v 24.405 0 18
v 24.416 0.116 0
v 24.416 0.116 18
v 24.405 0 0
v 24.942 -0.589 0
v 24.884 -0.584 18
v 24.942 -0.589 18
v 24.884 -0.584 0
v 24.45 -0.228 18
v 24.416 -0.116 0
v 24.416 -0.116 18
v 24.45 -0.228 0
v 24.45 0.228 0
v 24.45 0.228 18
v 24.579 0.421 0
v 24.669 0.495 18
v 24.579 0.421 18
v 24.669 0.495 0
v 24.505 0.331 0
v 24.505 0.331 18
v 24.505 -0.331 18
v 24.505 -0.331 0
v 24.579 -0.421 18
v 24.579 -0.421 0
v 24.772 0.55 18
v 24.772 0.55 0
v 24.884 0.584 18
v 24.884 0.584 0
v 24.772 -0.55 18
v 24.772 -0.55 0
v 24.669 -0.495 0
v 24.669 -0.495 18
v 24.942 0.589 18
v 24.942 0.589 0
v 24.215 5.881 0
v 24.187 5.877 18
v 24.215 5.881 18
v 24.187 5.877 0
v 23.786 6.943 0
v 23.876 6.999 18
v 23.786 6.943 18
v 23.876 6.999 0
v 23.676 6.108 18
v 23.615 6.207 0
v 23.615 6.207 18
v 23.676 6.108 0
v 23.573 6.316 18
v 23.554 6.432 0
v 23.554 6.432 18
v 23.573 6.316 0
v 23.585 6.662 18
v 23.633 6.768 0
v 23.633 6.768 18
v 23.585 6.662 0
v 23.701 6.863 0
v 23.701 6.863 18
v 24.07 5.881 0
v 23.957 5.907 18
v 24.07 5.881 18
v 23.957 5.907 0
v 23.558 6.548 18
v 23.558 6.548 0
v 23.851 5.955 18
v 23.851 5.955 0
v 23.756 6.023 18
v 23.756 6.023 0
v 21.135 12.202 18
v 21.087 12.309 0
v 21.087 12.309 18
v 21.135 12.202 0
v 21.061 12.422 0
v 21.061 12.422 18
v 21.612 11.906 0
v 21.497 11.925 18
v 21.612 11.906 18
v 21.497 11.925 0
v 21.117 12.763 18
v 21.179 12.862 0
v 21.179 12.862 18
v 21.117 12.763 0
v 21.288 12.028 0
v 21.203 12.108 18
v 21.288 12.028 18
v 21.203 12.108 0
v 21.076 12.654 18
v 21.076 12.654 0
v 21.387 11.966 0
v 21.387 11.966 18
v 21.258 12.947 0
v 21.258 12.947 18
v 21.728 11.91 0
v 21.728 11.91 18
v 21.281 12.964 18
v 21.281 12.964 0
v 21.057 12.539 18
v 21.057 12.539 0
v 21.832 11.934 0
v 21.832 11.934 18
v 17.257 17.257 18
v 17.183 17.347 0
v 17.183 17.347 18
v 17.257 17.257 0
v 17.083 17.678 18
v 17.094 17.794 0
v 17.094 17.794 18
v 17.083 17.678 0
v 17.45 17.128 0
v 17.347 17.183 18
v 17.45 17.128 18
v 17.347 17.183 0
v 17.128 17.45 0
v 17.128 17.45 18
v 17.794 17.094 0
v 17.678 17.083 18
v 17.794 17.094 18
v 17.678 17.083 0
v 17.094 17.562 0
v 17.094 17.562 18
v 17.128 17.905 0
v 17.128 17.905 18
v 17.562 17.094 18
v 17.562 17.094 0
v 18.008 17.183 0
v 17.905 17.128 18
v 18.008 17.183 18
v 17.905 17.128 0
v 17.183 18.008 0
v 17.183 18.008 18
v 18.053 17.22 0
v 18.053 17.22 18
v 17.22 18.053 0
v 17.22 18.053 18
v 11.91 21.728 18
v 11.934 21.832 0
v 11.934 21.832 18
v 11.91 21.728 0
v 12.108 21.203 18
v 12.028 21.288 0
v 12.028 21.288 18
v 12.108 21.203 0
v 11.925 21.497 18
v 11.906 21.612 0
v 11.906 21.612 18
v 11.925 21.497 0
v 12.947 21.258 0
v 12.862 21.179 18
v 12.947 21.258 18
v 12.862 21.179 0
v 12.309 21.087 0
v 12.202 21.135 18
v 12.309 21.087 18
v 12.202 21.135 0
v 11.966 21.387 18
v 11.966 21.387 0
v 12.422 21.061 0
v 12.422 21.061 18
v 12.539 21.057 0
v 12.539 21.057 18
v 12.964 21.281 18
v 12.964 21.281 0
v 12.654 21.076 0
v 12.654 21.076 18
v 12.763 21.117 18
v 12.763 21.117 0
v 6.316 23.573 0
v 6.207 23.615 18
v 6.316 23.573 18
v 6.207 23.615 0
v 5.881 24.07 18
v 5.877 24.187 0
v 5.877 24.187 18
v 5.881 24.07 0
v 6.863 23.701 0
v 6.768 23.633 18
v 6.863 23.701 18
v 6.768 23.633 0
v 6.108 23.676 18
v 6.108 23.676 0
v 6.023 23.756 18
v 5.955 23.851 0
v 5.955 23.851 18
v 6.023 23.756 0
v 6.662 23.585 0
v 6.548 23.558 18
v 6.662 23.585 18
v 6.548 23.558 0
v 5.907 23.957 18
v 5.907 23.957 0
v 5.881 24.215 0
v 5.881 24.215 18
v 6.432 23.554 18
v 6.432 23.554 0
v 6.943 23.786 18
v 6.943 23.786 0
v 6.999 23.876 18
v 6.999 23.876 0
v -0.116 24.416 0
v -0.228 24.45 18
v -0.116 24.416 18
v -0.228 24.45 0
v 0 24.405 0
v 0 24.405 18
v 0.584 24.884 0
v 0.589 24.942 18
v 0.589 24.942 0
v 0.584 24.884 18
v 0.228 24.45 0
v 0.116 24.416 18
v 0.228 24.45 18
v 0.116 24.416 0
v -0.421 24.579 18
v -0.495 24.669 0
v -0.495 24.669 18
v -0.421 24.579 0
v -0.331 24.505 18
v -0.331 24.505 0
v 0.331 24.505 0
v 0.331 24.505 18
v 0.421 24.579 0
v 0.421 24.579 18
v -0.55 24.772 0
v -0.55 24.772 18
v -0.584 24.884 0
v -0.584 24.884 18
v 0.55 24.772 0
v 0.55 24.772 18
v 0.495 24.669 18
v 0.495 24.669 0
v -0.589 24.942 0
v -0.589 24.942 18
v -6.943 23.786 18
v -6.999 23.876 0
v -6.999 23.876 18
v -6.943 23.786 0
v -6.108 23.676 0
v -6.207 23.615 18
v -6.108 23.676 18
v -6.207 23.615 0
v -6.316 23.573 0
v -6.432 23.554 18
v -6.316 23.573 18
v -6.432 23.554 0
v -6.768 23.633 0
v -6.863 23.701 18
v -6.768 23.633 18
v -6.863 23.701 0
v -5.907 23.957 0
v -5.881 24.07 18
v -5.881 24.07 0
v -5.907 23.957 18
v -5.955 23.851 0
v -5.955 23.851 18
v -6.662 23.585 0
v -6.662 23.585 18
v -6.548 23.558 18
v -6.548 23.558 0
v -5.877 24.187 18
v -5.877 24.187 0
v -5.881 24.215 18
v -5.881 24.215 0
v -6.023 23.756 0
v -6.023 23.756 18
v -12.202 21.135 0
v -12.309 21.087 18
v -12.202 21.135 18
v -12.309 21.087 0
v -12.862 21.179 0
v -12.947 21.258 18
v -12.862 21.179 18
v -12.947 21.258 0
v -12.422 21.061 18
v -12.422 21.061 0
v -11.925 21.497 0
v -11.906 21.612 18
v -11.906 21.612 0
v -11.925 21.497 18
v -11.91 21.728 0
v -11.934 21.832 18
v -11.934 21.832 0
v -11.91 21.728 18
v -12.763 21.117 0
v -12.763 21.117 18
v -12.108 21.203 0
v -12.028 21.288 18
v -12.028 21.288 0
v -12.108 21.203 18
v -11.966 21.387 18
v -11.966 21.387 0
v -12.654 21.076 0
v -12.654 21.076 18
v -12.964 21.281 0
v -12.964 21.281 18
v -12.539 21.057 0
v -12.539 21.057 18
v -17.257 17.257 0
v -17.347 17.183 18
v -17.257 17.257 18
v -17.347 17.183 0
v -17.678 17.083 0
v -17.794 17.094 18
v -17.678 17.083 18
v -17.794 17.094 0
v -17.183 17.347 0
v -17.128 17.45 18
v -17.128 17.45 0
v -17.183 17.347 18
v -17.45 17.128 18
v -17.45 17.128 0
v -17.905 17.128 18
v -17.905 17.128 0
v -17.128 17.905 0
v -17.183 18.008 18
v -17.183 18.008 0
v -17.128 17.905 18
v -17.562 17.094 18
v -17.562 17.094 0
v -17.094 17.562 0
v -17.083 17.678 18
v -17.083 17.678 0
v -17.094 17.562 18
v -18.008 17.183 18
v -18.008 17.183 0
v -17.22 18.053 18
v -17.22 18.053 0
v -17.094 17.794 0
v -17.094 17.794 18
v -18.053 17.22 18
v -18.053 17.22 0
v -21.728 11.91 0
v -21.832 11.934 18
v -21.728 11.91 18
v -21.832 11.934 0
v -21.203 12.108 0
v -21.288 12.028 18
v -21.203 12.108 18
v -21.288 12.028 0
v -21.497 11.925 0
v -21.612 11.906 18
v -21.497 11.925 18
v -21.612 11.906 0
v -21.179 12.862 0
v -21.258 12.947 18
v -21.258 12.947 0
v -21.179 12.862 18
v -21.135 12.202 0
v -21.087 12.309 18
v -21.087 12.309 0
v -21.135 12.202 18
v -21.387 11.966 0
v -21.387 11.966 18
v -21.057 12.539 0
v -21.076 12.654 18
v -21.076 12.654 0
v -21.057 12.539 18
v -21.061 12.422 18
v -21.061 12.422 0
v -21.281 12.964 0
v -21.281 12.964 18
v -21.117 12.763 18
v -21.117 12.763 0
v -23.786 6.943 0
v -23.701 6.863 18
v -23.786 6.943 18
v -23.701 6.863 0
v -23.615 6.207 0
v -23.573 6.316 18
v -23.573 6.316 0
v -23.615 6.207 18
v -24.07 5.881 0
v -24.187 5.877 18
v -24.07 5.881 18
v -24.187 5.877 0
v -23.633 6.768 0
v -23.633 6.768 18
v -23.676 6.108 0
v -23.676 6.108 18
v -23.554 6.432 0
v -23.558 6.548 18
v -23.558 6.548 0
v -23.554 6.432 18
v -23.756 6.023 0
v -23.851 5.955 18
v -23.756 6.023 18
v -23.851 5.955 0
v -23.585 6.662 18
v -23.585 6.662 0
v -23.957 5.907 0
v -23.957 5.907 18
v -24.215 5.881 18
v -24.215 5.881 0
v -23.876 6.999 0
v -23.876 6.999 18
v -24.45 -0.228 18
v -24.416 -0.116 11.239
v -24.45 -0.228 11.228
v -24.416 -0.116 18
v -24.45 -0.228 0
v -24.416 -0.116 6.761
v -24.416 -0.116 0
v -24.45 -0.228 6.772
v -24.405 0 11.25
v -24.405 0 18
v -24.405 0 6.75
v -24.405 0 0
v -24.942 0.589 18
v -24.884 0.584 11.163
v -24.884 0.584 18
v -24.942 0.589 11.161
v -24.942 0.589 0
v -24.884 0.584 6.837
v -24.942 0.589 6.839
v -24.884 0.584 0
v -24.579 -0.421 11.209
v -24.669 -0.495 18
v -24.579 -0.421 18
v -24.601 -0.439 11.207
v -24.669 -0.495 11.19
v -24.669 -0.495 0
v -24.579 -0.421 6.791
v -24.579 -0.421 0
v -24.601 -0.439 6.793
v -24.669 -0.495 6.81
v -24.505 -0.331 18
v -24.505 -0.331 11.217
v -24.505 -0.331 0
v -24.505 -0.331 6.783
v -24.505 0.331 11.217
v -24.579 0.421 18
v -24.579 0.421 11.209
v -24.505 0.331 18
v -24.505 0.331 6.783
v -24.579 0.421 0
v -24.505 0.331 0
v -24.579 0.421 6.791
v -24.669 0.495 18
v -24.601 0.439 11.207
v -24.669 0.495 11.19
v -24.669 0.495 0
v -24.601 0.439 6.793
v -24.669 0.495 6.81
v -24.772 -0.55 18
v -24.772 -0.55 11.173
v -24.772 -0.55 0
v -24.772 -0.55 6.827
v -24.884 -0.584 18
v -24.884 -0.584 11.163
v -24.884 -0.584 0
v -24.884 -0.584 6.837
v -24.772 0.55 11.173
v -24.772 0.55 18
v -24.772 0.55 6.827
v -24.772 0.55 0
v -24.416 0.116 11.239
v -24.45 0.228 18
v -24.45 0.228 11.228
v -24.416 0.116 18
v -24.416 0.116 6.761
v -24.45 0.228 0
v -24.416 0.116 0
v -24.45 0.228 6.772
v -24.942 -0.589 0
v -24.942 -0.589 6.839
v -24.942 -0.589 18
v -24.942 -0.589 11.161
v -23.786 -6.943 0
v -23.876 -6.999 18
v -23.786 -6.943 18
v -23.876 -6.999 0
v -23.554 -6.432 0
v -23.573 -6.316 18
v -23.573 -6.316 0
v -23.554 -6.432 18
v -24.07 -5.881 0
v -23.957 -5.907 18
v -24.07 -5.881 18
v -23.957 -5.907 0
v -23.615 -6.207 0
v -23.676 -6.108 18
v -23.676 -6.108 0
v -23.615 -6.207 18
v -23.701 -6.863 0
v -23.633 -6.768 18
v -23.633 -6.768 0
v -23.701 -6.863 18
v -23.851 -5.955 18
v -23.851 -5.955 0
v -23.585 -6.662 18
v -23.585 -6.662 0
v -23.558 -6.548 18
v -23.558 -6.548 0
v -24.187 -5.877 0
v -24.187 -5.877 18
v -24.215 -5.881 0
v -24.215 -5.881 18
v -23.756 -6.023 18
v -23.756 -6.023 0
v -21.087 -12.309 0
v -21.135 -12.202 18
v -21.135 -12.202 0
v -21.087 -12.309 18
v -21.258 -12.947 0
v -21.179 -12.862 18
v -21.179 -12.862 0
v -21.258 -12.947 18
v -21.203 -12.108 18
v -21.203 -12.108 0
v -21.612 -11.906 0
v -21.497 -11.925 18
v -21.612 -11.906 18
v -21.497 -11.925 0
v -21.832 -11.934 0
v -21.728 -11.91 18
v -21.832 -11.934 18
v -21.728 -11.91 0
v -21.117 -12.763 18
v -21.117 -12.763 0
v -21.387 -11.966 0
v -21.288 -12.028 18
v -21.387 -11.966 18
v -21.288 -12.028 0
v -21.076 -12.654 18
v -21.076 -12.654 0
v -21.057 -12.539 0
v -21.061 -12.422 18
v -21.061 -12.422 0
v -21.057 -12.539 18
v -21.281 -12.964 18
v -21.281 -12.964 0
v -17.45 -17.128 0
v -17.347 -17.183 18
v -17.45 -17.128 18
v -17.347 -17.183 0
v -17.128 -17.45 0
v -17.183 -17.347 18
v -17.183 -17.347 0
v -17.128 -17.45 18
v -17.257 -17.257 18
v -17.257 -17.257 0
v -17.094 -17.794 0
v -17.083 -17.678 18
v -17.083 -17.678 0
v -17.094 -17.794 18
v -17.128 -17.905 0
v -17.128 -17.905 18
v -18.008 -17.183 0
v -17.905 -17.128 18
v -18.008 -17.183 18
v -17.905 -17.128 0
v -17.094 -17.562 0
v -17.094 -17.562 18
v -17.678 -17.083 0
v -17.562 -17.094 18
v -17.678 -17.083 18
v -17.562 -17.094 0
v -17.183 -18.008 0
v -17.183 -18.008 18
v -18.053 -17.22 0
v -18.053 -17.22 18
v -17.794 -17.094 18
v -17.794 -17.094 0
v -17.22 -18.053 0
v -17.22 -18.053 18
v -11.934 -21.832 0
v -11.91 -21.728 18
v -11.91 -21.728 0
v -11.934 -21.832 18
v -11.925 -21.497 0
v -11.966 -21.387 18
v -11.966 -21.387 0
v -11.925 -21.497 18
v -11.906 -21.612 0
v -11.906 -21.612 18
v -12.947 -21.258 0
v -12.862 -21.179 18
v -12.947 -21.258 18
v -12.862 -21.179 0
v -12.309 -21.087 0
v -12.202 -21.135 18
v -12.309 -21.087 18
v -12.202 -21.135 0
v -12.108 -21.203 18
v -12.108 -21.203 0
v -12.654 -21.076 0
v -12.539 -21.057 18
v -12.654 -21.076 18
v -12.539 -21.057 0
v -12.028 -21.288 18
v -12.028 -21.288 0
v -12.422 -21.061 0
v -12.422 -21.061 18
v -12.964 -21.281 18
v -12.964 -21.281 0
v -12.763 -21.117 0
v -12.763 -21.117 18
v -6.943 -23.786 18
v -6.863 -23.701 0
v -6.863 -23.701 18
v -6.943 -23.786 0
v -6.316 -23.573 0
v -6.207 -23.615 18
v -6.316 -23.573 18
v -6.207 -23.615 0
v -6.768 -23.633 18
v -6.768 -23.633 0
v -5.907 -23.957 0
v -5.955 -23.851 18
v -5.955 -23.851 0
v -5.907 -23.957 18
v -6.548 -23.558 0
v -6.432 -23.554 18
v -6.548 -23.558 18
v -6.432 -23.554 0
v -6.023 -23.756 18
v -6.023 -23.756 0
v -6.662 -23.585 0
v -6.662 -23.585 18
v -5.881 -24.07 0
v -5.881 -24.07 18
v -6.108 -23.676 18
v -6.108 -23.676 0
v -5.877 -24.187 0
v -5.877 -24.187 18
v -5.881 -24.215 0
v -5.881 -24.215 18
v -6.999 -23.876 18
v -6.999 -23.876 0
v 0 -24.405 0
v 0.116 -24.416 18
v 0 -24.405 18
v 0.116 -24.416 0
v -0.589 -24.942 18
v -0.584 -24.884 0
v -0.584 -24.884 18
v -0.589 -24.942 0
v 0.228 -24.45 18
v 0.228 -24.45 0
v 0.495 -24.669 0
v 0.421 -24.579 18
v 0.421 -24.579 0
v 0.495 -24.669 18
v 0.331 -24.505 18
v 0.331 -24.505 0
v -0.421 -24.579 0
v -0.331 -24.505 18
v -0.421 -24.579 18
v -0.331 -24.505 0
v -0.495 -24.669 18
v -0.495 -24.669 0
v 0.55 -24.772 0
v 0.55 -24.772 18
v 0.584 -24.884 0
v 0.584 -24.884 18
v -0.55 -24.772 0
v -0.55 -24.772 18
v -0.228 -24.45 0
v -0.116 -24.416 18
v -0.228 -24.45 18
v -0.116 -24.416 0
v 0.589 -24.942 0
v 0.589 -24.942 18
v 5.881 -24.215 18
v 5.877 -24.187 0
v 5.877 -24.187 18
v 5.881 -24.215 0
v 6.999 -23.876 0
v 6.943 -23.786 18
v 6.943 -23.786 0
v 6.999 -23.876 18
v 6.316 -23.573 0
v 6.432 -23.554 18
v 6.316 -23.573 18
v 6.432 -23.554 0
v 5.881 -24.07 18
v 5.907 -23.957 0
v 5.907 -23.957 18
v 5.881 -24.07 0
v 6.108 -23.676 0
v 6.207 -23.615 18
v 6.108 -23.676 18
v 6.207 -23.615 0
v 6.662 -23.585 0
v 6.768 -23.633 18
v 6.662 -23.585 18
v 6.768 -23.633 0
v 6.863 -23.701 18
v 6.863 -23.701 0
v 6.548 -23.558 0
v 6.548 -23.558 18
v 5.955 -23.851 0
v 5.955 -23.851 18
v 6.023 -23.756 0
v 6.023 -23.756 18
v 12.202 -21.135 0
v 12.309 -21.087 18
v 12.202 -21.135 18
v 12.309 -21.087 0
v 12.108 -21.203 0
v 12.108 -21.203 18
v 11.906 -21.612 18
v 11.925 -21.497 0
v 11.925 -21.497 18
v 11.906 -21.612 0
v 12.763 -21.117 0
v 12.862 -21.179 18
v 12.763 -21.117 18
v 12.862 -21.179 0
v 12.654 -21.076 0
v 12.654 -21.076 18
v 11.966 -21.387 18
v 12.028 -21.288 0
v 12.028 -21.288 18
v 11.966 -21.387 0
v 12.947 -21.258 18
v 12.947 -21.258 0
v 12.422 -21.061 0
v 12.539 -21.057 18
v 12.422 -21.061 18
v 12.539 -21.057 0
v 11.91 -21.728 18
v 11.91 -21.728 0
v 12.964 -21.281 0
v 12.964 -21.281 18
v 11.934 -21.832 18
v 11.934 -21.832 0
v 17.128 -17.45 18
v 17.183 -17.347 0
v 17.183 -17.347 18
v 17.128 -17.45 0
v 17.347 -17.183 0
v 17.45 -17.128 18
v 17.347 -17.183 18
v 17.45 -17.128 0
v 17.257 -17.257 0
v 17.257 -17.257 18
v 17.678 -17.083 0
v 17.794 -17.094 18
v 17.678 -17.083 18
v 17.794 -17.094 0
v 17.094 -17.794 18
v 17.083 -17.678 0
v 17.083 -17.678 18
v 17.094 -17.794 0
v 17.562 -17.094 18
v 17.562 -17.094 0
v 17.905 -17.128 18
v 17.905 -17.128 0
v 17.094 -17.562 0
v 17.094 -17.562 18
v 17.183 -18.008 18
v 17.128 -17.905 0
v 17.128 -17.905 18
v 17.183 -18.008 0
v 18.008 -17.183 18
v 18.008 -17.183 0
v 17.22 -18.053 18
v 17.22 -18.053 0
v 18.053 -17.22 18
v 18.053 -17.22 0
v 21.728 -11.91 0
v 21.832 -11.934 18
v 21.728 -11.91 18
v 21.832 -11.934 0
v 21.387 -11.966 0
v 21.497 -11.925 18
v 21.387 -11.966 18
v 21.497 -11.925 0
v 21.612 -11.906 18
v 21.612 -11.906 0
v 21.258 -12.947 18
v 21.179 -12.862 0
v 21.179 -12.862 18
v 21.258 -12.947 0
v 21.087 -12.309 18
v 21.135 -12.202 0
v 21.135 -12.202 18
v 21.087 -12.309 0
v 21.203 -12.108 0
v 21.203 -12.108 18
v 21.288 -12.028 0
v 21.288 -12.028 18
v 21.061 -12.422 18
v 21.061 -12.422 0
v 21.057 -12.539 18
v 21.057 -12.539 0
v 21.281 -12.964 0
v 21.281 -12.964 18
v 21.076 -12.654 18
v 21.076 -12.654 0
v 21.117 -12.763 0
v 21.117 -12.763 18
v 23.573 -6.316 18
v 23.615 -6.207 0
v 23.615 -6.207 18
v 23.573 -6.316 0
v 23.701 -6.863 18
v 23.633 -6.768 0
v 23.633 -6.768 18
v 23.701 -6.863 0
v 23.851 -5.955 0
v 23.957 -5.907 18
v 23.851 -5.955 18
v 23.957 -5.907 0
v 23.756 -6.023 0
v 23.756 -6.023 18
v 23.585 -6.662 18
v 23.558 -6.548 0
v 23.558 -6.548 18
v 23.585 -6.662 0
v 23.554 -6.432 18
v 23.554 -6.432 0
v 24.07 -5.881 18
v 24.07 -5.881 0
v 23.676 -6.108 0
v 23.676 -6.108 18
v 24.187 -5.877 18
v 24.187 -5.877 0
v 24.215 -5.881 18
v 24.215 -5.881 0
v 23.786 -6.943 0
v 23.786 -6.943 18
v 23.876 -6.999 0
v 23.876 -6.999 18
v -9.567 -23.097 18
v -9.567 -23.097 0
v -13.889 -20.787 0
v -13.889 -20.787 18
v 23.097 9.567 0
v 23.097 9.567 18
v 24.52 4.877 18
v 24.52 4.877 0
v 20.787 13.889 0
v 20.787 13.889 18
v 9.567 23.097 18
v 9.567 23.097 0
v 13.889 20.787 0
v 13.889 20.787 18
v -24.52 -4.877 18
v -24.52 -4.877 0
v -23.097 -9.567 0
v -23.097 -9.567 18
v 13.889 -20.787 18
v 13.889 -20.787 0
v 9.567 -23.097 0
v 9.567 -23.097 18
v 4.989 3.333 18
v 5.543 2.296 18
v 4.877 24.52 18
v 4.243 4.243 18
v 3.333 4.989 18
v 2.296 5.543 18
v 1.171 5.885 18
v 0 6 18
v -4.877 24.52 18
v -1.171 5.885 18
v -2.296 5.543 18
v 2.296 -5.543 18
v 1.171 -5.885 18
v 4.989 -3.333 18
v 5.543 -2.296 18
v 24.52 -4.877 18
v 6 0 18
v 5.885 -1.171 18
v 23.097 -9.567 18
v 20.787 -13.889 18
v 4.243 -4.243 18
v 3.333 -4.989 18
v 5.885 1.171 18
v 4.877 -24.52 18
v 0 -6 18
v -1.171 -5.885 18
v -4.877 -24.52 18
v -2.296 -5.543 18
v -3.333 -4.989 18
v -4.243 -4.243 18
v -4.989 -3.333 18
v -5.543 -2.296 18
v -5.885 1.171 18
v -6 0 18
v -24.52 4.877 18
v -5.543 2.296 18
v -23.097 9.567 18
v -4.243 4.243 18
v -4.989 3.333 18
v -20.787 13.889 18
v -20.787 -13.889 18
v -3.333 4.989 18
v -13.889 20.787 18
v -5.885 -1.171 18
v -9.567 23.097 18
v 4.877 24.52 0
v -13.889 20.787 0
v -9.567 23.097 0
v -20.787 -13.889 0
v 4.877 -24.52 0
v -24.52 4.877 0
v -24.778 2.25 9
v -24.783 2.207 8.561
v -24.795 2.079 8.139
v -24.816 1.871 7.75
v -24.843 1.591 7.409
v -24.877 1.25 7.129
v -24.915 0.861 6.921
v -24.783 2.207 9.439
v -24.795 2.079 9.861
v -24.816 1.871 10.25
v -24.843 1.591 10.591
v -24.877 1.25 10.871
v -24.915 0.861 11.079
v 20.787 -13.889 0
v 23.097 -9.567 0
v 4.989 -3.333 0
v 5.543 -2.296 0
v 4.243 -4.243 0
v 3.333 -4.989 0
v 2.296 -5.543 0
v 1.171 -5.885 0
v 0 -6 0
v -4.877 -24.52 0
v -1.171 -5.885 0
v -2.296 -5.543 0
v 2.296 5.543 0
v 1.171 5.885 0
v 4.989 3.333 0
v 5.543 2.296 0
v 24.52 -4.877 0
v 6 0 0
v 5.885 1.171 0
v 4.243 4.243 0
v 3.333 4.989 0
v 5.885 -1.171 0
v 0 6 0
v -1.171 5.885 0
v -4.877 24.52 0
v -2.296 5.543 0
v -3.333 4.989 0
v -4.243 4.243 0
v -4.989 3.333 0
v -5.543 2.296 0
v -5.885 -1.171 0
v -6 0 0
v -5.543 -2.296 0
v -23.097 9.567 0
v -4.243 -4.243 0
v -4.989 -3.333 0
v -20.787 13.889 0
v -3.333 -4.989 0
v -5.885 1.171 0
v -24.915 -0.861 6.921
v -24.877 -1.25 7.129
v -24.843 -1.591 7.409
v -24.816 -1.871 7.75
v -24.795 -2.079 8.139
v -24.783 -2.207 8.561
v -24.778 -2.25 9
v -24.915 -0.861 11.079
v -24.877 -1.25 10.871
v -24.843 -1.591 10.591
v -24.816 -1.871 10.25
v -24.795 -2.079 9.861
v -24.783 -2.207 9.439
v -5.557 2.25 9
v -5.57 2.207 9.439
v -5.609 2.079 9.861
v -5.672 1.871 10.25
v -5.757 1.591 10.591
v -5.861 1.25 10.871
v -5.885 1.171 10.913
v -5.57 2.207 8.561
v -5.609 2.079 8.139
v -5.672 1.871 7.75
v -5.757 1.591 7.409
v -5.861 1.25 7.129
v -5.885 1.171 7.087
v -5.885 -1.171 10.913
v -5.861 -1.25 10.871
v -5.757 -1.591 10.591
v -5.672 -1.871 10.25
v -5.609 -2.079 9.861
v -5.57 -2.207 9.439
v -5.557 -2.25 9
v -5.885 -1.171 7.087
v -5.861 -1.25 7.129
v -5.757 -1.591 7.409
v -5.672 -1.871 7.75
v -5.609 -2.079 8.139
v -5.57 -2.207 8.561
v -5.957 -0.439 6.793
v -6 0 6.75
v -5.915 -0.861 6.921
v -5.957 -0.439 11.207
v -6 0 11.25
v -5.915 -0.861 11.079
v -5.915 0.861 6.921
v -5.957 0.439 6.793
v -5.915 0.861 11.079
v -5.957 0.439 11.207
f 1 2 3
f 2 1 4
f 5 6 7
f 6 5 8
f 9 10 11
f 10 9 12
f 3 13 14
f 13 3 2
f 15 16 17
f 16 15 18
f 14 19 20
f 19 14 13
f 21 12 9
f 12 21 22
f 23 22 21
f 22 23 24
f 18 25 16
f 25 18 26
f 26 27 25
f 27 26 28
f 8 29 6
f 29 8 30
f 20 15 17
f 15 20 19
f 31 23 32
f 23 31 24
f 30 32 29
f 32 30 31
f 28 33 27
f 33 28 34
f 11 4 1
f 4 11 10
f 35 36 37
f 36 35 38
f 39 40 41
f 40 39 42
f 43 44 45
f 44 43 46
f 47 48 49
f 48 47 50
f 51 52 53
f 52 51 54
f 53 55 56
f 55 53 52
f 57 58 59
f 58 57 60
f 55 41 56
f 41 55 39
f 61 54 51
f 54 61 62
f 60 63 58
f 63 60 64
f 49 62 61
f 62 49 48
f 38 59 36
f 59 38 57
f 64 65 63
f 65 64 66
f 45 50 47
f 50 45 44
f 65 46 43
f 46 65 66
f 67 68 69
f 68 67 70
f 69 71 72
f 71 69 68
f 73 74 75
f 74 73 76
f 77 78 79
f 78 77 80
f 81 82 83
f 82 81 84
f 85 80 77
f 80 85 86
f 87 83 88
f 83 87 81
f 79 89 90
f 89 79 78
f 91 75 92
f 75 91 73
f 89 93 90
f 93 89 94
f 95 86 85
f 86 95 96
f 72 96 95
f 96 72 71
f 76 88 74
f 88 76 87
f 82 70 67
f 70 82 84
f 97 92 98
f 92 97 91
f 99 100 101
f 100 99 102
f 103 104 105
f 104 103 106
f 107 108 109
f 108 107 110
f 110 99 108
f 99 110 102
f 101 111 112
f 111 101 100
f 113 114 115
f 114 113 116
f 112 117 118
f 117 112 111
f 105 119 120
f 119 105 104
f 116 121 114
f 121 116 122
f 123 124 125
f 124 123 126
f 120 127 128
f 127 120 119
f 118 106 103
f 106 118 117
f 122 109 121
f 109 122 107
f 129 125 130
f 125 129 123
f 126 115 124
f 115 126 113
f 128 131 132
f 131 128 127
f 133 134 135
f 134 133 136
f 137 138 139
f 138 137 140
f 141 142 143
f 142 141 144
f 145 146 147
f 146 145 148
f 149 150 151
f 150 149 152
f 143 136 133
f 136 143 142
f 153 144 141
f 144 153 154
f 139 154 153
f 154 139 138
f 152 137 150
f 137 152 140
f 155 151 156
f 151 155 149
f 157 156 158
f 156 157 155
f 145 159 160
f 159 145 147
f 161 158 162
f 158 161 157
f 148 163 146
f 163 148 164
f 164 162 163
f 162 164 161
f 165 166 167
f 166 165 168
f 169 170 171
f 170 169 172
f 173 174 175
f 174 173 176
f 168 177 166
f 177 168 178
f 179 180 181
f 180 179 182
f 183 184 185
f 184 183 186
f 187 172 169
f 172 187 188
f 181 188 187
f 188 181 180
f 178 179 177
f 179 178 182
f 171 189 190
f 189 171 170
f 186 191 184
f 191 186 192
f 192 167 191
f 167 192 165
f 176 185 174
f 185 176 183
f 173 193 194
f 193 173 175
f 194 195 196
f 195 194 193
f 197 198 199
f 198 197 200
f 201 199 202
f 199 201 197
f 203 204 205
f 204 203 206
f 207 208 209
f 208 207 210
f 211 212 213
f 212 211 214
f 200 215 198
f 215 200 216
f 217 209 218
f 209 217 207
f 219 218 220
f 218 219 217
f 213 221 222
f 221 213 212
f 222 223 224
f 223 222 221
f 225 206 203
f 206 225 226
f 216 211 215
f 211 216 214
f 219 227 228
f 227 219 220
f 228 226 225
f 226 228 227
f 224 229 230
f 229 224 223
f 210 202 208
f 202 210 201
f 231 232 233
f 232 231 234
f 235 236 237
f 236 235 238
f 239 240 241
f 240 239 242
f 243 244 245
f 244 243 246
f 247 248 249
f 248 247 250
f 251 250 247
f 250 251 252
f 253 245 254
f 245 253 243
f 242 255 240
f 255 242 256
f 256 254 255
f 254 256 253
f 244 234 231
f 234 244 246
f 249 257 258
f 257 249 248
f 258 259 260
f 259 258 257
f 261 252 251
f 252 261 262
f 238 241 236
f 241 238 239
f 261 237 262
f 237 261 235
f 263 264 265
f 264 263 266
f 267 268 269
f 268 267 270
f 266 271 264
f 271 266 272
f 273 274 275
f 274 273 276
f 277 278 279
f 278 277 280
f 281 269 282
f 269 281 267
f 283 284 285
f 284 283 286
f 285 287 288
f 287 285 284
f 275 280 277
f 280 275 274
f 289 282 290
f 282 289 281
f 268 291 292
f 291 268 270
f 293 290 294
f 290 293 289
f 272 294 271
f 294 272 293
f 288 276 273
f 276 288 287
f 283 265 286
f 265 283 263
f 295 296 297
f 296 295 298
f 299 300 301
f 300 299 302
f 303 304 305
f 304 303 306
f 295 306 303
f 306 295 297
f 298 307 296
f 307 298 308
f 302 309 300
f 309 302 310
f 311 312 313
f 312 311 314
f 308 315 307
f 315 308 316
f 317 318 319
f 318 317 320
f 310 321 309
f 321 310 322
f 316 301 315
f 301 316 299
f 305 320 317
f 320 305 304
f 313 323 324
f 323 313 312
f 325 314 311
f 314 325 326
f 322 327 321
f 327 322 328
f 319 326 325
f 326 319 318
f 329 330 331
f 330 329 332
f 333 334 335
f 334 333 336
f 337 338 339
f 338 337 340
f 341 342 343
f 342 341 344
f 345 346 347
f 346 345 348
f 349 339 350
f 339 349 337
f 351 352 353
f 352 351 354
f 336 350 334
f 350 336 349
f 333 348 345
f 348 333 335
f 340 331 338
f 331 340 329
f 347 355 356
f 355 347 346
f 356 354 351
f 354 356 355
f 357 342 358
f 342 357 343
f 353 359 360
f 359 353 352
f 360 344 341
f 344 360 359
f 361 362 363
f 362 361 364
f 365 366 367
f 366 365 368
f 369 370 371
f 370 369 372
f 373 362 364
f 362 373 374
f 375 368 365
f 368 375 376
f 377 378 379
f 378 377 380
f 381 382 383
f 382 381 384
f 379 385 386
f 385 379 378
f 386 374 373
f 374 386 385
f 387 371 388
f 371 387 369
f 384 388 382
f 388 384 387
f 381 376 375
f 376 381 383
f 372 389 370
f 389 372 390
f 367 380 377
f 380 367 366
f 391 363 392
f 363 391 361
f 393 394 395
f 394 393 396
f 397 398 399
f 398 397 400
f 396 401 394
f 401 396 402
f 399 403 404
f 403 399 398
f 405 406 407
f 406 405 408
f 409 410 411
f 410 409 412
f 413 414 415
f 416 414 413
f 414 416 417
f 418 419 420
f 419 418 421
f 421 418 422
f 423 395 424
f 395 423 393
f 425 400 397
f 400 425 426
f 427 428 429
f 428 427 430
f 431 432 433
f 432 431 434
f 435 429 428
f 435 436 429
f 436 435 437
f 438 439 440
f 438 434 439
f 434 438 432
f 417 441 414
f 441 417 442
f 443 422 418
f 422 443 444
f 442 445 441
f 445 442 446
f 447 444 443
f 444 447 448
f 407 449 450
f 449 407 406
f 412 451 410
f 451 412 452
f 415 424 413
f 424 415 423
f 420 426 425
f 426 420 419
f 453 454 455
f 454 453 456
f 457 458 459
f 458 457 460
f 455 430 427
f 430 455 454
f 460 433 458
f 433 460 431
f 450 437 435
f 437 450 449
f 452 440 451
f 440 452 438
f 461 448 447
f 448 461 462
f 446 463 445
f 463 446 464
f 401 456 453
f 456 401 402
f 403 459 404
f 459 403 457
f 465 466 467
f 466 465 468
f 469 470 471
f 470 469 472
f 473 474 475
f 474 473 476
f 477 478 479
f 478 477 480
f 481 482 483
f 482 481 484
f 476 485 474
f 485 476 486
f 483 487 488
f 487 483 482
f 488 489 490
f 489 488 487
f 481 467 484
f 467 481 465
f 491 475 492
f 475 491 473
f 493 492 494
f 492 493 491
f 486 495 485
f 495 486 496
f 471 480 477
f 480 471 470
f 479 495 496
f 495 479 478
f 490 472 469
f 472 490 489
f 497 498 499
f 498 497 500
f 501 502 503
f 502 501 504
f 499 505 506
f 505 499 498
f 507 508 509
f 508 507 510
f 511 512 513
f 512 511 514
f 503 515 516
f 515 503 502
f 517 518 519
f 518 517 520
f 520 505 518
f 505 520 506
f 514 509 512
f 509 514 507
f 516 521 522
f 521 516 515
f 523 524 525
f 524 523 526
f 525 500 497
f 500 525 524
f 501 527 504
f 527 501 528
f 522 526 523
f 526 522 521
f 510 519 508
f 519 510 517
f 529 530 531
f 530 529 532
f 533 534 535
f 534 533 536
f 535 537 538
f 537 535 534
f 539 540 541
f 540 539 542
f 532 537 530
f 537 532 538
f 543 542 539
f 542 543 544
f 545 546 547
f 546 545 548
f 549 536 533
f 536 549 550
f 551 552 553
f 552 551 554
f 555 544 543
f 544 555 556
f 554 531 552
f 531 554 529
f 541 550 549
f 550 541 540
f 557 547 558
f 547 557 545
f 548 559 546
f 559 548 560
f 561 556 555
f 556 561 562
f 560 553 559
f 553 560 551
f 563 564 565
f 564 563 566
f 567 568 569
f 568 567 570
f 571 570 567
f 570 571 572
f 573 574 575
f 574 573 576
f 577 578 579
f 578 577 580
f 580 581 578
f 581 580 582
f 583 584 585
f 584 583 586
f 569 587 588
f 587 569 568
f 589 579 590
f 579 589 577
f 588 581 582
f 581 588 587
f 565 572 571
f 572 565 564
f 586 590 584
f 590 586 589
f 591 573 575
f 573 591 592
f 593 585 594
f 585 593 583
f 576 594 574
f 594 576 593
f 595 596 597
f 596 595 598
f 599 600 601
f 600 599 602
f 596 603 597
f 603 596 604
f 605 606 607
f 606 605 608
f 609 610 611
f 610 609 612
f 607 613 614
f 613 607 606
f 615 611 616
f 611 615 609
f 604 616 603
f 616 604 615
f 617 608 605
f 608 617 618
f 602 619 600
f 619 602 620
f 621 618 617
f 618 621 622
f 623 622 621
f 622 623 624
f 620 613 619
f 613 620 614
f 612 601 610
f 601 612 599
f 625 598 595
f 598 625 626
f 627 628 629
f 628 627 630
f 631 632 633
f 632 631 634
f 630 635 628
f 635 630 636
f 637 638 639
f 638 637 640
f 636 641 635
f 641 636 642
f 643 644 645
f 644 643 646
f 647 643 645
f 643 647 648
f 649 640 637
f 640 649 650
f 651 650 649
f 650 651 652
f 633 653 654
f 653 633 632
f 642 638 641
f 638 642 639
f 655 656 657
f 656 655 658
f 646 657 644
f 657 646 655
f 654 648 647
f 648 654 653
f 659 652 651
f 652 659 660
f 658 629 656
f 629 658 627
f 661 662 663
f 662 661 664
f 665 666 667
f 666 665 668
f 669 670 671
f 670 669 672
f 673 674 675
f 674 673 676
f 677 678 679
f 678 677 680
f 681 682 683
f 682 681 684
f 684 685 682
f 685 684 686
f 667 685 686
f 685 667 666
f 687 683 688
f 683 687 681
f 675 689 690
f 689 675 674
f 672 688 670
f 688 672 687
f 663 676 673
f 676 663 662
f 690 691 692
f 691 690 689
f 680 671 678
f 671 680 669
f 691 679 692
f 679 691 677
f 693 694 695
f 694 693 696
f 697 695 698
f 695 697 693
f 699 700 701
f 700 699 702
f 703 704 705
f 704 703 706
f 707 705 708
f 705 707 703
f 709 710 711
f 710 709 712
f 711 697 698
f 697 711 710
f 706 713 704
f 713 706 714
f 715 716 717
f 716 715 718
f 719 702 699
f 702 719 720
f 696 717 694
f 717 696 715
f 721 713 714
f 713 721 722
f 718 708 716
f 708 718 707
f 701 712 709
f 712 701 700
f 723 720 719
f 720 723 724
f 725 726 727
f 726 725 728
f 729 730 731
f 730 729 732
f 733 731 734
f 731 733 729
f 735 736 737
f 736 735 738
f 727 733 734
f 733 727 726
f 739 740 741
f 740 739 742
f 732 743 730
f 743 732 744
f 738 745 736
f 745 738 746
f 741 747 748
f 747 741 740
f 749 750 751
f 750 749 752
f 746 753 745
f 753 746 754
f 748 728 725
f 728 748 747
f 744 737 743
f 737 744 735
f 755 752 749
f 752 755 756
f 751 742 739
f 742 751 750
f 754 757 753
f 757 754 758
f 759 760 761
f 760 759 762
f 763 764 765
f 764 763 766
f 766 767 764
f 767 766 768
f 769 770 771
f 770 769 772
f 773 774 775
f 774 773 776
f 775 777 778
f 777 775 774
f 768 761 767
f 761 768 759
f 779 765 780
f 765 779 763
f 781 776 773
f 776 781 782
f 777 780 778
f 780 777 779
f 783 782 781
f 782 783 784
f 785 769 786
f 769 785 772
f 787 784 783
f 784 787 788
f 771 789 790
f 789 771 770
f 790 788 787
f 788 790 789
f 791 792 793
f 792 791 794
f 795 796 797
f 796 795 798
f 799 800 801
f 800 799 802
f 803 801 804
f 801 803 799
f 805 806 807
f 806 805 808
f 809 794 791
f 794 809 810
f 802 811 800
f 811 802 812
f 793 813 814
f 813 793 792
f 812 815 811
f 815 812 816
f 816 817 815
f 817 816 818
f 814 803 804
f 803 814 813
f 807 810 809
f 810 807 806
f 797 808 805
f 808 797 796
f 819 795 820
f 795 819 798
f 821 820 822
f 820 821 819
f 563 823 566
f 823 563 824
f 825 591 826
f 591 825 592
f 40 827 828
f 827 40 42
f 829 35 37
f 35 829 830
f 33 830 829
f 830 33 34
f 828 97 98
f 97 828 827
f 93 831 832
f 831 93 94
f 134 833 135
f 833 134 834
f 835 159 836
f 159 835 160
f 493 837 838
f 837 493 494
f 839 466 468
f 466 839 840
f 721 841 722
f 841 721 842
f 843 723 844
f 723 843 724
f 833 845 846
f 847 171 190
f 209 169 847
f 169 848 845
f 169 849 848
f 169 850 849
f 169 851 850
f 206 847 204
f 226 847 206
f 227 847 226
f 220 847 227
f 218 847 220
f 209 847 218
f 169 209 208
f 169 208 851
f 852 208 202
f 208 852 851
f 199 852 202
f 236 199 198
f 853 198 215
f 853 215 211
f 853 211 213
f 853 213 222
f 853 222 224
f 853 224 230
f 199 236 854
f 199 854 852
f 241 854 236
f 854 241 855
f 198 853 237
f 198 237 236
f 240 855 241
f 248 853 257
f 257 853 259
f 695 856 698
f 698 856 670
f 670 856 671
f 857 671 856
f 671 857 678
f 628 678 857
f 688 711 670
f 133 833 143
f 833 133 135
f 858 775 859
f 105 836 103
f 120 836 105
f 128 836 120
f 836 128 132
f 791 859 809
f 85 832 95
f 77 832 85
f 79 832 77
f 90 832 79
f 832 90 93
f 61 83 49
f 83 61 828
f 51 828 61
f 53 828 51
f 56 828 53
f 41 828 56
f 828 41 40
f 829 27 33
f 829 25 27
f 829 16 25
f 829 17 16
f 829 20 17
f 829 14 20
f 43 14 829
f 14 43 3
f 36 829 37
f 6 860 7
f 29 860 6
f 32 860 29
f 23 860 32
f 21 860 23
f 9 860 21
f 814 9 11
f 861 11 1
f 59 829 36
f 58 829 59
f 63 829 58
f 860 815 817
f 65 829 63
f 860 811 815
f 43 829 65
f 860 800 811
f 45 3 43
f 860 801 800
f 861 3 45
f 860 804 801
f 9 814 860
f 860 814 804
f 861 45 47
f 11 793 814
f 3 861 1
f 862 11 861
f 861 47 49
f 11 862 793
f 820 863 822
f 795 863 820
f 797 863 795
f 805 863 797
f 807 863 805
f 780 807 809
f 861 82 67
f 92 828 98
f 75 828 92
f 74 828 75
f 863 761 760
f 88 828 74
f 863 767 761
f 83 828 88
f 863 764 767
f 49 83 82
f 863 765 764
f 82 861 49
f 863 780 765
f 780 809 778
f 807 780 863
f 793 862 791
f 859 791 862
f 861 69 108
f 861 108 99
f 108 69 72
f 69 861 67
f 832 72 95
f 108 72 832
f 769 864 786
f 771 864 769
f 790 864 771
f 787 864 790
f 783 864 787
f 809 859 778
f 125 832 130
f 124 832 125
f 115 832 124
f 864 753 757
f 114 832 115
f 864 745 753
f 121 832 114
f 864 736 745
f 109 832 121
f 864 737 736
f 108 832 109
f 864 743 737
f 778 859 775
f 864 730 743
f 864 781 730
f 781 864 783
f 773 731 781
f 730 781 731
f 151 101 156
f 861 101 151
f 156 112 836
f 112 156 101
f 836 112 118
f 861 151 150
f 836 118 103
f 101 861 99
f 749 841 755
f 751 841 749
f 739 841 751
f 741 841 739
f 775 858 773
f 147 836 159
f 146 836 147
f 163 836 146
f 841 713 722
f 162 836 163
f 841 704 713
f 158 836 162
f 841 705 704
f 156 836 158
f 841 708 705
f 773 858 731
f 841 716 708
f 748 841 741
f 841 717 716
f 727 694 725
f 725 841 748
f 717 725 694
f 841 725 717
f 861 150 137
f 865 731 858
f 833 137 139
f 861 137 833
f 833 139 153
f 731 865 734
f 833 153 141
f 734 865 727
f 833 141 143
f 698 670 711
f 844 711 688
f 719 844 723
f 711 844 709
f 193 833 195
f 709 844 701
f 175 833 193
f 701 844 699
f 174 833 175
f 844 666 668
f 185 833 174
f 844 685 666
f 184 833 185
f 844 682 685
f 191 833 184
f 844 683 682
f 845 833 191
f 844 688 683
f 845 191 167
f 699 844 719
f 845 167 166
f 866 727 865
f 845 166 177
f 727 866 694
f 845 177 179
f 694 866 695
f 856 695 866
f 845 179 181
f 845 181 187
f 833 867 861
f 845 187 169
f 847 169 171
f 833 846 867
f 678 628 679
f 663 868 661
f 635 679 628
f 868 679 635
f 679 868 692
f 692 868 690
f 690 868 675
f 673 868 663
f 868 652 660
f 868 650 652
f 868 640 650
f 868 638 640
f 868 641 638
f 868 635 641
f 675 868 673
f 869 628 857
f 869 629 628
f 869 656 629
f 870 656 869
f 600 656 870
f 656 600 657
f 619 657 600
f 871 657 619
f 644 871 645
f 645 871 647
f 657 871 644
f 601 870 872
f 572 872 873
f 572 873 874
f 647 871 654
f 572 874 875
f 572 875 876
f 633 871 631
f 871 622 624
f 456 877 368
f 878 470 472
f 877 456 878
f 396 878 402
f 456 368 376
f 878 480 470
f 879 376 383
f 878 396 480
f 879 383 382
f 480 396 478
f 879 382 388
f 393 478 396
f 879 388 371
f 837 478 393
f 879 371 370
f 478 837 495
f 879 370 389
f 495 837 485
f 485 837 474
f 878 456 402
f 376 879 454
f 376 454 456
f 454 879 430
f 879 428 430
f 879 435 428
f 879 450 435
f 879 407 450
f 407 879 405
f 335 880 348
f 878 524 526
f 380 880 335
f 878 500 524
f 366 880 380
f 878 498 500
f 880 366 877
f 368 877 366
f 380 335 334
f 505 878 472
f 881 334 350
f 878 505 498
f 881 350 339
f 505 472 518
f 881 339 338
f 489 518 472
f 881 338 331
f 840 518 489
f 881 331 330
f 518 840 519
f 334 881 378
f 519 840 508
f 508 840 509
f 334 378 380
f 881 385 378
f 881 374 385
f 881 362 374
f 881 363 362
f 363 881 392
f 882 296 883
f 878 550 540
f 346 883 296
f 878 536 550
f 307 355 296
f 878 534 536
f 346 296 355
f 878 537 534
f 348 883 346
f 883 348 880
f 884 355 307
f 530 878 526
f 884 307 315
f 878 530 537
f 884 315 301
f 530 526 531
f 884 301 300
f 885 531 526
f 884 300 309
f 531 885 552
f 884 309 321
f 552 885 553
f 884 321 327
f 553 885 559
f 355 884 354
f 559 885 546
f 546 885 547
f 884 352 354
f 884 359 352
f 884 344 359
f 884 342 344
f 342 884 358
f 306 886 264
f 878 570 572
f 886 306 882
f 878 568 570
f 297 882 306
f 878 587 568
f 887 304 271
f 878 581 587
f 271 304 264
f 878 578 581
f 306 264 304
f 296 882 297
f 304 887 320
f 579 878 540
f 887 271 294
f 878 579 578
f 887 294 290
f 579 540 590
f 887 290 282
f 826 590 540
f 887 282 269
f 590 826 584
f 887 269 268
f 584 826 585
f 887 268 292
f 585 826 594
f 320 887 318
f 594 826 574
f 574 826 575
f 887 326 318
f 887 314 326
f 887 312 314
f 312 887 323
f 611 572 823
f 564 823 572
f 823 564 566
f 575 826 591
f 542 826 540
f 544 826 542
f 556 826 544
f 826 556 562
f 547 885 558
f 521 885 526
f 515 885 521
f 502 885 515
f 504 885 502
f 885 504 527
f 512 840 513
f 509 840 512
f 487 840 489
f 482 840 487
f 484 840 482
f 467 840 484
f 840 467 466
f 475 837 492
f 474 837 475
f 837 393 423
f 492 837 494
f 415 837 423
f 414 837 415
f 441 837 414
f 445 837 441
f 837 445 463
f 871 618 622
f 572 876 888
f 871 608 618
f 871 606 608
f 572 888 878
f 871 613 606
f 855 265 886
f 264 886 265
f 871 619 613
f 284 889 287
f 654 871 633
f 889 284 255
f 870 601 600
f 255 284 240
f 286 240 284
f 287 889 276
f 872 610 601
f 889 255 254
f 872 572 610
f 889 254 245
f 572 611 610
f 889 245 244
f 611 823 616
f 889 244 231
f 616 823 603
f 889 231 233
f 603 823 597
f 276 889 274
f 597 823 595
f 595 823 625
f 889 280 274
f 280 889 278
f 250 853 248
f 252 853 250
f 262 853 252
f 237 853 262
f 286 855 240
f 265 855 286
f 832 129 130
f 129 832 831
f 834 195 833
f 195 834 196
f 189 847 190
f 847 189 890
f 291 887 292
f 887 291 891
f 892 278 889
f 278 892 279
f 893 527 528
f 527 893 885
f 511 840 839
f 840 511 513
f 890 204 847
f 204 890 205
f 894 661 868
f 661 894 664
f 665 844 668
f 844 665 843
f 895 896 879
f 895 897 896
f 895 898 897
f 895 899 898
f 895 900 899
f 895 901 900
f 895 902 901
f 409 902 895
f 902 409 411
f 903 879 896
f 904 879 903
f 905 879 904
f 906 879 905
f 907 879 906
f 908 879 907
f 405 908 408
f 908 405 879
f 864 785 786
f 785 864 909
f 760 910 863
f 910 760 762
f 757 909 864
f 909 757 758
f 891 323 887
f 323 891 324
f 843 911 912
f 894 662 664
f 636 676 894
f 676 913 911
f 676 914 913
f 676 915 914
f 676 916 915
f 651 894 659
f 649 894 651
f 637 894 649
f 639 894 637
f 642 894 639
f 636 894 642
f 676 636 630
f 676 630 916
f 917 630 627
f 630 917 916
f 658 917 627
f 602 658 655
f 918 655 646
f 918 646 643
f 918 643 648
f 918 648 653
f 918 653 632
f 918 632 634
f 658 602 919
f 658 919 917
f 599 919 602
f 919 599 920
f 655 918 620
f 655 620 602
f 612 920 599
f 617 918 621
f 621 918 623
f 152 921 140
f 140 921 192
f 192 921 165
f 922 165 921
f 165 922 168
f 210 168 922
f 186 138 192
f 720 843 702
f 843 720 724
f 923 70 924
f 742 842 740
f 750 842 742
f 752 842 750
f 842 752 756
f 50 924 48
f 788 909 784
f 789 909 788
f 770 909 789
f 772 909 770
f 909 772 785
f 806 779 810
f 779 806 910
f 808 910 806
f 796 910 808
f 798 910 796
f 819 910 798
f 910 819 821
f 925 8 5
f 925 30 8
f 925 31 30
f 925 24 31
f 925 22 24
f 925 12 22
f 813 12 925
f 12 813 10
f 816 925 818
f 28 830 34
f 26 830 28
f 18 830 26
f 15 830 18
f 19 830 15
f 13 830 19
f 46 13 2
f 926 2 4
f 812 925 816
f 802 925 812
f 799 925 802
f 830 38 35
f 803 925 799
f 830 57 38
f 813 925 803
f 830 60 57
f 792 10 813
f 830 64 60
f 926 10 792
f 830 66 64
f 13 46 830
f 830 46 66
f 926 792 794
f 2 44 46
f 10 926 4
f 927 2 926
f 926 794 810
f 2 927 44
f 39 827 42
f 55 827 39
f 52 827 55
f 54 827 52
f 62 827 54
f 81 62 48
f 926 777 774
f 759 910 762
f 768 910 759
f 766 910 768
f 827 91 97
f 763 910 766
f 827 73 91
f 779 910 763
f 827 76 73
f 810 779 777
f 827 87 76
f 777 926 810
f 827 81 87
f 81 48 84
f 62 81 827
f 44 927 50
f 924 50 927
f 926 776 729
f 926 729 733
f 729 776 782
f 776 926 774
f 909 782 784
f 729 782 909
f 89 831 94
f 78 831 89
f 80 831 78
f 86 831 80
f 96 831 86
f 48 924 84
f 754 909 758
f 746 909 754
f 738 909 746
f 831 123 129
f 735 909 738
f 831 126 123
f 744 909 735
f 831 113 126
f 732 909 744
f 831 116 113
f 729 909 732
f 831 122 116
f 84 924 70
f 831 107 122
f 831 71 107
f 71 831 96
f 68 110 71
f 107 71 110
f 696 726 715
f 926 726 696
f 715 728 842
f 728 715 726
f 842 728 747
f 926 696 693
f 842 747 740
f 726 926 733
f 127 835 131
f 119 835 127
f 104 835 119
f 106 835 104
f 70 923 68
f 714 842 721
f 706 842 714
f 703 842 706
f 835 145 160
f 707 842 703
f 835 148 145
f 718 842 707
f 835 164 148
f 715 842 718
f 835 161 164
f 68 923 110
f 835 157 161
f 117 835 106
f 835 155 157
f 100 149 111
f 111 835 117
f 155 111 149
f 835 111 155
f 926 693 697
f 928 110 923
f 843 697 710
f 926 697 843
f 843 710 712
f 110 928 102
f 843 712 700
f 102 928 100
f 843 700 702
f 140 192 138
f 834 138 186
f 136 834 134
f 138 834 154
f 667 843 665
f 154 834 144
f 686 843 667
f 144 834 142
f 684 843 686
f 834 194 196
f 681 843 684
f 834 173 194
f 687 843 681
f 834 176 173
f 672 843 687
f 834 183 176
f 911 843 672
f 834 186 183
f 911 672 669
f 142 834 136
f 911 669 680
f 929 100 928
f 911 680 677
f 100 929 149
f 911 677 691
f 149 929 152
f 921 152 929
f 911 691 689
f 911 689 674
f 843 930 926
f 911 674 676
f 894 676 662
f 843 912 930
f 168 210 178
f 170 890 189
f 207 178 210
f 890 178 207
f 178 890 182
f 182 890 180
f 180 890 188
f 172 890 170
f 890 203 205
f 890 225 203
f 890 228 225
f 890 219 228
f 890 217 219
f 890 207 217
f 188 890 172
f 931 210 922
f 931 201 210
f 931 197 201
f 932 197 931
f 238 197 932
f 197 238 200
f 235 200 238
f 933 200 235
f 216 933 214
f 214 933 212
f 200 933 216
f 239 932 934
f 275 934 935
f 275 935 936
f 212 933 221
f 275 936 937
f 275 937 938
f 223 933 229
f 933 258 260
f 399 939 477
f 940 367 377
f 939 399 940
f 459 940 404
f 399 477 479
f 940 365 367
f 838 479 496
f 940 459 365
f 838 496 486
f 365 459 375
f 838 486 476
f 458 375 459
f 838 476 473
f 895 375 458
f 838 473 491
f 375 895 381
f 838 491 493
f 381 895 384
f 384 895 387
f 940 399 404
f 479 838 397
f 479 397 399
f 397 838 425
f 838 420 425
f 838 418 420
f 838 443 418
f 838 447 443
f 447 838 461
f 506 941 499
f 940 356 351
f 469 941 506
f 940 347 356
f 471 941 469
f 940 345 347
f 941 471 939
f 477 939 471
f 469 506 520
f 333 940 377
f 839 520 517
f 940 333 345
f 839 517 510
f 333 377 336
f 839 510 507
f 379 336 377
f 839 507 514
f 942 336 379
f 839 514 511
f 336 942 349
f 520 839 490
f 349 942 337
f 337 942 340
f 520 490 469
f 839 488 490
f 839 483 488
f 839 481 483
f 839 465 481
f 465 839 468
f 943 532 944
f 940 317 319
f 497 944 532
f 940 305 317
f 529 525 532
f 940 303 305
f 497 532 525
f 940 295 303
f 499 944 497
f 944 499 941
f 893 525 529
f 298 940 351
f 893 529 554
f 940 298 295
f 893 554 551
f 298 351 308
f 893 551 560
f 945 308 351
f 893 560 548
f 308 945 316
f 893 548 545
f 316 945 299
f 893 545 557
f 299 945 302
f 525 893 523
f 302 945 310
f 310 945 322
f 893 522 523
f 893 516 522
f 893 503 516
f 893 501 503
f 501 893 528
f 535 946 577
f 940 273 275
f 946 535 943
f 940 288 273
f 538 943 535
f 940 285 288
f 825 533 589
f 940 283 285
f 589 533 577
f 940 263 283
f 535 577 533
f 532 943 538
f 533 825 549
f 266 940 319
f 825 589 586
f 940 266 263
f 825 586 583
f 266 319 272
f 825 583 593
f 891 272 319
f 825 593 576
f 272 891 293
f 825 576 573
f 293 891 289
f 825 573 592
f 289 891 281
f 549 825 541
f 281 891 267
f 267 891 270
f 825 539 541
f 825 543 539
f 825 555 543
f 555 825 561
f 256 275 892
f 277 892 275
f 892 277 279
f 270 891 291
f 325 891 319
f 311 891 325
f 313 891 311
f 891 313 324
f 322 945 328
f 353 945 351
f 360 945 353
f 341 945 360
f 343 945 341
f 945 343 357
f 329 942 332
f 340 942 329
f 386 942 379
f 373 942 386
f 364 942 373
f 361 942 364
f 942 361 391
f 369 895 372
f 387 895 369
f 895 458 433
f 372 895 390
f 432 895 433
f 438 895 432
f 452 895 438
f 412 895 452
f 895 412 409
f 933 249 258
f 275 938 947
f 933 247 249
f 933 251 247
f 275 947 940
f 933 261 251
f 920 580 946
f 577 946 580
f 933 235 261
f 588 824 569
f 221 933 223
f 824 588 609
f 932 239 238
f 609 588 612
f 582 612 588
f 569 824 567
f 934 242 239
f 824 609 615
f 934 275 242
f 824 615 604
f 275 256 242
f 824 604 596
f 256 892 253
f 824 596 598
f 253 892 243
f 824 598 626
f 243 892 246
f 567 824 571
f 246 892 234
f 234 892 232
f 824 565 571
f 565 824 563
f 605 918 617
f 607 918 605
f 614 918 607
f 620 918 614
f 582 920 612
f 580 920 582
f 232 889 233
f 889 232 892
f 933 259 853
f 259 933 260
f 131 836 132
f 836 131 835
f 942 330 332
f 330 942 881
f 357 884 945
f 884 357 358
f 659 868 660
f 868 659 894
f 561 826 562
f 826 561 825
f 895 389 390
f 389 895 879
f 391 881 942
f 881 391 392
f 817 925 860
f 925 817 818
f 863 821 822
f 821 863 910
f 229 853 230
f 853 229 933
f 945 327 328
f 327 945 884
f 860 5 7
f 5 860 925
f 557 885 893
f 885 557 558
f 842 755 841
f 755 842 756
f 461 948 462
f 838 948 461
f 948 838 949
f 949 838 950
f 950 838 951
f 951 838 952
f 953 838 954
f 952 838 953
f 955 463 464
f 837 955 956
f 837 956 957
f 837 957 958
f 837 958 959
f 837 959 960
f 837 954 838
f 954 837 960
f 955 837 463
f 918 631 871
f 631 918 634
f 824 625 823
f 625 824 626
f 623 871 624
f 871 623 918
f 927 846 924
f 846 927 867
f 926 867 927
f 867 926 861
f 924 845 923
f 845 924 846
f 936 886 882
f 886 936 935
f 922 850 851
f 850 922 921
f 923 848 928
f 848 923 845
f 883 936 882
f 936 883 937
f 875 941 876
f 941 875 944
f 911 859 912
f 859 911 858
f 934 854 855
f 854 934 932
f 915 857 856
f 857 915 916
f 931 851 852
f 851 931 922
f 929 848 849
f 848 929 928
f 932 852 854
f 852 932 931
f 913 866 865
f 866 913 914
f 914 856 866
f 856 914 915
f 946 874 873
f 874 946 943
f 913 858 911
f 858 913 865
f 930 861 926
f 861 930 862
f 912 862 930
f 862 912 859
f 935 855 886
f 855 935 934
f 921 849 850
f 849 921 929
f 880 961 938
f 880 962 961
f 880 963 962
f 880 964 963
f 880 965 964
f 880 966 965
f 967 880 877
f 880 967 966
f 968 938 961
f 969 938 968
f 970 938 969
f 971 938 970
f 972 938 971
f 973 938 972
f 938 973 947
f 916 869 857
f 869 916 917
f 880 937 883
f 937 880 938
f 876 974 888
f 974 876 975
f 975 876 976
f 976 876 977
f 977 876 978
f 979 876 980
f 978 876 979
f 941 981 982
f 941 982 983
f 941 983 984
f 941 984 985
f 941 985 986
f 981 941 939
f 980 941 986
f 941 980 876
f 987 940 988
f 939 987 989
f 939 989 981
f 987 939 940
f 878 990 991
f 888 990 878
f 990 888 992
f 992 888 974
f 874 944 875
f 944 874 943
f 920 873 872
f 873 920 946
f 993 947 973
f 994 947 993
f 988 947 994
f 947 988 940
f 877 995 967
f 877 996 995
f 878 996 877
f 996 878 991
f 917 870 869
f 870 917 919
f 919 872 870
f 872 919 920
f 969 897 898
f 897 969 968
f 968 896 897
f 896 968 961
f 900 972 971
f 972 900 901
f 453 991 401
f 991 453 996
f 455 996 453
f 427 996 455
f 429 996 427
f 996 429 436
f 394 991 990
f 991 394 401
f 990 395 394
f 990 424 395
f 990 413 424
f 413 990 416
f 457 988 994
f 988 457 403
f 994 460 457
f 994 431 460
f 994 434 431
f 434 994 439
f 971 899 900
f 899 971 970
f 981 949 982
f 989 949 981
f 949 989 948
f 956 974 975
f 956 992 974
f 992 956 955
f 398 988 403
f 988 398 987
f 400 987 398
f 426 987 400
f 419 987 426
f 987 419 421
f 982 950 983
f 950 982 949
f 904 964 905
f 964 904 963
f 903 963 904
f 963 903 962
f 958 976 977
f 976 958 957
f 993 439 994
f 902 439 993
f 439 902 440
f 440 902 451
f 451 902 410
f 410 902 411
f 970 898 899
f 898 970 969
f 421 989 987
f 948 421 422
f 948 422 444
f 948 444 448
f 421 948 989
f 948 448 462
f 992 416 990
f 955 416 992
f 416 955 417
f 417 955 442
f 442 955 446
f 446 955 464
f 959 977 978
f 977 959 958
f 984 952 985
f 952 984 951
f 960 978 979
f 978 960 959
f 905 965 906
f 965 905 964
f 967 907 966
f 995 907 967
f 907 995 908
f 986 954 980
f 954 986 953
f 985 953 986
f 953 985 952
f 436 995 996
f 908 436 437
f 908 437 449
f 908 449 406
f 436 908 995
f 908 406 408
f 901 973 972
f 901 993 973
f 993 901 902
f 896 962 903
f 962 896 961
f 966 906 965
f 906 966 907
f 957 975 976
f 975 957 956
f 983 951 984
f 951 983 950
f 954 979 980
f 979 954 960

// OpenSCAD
$fn = 32;

// ----------------------------------------------------------------------
// Hand knob: 50 x 50 x 18 mm
// ----------------------------------------------------------------------

// --- parameters (mm) ---
knob_d = 50;              // knob diameter
knob_h = 18;              // knob height
bore_d = 12;              // shaft bore
set_d = 4.5;              // set screw tap hole
knurl_d = 1.19;           // knurl groove diameter
knurl_n = 24;             // number of knurl grooves

module body() {
  cylinder(h = knob_h, d = knob_d);
}

difference() {
  union() {
    body();
  }
  translate([0, 0, -1]) cylinder(h = knob_h + 0 + 2, d = bore_d);
  /* knurl grooves */
  for (i = [0 : knurl_n - 1])
    rotate([0, 0, i * 360 / knurl_n])
      translate([knob_d / 2, 0, -0.5])
        cylinder(h = knob_h + 1, d = knurl_d);
  translate([-knob_d / 2 - 1, 0, knob_h * 0.5]) rotate([0, 90, 0]) cylinder(h = knob_d / 2 + 2, d = set_d);
}
